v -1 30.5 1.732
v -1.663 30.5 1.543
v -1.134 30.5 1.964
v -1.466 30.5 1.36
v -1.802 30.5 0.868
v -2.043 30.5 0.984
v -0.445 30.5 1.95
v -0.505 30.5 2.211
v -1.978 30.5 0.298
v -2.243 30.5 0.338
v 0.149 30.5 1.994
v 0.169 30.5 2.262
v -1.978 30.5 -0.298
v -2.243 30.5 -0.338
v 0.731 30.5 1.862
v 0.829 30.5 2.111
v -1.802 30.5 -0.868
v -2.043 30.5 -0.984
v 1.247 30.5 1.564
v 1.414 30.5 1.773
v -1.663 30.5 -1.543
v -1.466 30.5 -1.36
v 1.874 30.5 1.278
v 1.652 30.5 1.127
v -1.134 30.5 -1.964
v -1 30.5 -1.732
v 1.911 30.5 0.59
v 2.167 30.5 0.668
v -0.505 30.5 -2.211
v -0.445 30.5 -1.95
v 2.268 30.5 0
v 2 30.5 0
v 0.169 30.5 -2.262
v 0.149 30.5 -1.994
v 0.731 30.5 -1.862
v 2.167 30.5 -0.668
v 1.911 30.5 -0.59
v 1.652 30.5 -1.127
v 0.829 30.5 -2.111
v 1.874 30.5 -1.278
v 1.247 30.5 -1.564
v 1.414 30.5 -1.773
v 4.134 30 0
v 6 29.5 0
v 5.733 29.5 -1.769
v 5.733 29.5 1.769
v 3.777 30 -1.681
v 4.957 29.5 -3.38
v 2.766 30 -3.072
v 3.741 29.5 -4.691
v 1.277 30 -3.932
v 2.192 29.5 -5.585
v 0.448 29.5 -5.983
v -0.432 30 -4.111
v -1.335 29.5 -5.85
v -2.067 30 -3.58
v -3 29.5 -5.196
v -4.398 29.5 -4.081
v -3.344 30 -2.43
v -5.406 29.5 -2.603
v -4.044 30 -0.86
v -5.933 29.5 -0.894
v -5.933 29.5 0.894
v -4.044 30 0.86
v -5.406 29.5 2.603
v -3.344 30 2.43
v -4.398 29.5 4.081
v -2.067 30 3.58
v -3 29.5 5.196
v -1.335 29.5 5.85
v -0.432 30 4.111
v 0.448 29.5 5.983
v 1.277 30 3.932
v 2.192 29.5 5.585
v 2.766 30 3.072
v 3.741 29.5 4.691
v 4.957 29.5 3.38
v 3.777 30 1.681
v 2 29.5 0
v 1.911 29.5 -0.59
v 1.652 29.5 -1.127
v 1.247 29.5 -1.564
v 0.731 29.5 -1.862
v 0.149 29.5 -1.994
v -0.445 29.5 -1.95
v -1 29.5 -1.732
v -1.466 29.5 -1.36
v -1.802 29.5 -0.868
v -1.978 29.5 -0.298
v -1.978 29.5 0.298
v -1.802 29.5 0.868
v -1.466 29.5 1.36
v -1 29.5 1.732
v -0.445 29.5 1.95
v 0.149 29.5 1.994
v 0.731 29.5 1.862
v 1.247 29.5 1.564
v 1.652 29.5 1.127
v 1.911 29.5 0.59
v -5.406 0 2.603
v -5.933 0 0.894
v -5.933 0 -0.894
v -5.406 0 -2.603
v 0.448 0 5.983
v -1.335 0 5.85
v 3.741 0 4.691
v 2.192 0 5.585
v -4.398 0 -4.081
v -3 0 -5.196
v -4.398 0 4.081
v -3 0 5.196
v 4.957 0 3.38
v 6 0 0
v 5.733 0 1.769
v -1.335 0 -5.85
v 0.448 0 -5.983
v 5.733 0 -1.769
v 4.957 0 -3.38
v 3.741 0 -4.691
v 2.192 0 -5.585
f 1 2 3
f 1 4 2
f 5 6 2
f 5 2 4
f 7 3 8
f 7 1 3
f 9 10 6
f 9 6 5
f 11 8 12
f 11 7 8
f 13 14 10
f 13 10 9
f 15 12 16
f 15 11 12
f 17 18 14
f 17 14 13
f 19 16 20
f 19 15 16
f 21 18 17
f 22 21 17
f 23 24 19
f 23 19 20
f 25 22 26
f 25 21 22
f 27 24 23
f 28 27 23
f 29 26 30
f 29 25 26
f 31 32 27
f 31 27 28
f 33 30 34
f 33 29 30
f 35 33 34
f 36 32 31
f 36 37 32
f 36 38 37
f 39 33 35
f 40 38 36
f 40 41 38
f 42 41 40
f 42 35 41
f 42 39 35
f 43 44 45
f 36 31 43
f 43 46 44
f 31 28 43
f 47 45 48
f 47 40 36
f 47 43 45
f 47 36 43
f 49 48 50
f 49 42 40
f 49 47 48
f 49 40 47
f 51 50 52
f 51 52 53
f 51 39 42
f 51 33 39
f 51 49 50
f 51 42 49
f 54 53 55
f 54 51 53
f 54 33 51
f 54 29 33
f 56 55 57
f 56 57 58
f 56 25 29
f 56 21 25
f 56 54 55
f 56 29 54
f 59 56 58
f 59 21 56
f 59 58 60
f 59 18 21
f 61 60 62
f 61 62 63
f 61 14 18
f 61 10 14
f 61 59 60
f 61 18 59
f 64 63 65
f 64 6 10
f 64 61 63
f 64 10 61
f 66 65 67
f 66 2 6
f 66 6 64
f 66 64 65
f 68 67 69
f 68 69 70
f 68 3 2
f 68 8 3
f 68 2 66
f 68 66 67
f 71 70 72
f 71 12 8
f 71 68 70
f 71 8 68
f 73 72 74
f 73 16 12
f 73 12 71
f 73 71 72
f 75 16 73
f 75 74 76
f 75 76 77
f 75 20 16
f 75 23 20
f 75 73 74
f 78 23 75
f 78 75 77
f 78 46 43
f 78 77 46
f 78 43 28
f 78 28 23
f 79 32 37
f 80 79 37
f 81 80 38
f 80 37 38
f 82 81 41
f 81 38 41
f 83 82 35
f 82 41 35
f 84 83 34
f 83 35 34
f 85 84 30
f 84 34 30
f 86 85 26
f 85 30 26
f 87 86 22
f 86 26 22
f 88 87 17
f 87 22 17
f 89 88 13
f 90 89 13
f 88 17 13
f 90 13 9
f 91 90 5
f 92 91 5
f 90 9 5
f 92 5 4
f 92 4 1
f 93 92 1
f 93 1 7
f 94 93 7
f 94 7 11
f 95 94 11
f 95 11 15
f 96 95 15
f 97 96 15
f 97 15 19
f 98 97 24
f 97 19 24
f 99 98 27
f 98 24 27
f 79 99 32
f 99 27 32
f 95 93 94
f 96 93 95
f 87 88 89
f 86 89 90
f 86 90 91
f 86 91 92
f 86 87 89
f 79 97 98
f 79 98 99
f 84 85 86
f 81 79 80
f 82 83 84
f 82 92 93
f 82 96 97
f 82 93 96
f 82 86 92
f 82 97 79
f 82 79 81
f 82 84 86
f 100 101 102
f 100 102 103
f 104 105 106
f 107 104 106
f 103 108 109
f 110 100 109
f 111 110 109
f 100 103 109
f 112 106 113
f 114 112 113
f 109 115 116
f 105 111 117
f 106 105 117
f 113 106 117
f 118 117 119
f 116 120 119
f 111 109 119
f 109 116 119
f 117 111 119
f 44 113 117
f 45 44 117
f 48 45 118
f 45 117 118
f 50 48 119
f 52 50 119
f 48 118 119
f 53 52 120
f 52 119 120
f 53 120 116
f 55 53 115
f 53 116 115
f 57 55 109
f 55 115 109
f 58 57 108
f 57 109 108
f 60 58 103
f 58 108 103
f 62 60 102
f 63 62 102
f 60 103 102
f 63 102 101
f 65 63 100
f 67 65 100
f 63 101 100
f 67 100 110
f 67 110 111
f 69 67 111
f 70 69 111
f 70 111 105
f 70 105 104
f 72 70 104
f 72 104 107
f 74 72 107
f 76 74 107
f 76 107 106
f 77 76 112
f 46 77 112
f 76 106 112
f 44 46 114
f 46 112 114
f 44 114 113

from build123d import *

# Parameters (mm, degrees)
ESQUISSE1_R             = 6
EXTRUSION1_DEPTH        = 30.5
CHANFREIN1_SIZE         = 1
CHANFREIN1_SIZE2        = 3.732050808
ESQUISSE2_R             = 2
ENL_V_MAT_EXTRU_1_DEPTH = 1


with BuildPart() as part:
    # Esquisse1 → Extrusion1 (new body)
    with BuildSketch(Plane(origin=(0, 0, 0), x_dir=(1, 0, 0), z_dir=(0, 1, 0))):
        Circle(ESQUISSE1_R)
    extrude(amount=EXTRUSION1_DEPTH)

    # Chanfrein1
    chanfrein1_edges = [part.edges().sort_by_distance(p)[0] for p in [
        (-6, 30.5, 0),
    ]]
    chanfrein1_side = [part.faces().sort_by_distance(p)[0] for p in [
        (-6, 15.25, 0),
    ]]
    chamfer(chanfrein1_edges, length=CHANFREIN1_SIZE, length2=CHANFREIN1_SIZE2, reference=chanfrein1_side[0])

    # Esquisse2 → Enlèv. mat.-Extru.1 (cut)
    with BuildSketch(Plane(origin=(0, 30.5, 0), x_dir=(1, 0, 0), z_dir=(0, 1, 0))):
        Circle(ESQUISSE2_R)
    extrude(amount=-ENL_V_MAT_EXTRU_1_DEPTH, mode=Mode.SUBTRACT)


solid = part.part
